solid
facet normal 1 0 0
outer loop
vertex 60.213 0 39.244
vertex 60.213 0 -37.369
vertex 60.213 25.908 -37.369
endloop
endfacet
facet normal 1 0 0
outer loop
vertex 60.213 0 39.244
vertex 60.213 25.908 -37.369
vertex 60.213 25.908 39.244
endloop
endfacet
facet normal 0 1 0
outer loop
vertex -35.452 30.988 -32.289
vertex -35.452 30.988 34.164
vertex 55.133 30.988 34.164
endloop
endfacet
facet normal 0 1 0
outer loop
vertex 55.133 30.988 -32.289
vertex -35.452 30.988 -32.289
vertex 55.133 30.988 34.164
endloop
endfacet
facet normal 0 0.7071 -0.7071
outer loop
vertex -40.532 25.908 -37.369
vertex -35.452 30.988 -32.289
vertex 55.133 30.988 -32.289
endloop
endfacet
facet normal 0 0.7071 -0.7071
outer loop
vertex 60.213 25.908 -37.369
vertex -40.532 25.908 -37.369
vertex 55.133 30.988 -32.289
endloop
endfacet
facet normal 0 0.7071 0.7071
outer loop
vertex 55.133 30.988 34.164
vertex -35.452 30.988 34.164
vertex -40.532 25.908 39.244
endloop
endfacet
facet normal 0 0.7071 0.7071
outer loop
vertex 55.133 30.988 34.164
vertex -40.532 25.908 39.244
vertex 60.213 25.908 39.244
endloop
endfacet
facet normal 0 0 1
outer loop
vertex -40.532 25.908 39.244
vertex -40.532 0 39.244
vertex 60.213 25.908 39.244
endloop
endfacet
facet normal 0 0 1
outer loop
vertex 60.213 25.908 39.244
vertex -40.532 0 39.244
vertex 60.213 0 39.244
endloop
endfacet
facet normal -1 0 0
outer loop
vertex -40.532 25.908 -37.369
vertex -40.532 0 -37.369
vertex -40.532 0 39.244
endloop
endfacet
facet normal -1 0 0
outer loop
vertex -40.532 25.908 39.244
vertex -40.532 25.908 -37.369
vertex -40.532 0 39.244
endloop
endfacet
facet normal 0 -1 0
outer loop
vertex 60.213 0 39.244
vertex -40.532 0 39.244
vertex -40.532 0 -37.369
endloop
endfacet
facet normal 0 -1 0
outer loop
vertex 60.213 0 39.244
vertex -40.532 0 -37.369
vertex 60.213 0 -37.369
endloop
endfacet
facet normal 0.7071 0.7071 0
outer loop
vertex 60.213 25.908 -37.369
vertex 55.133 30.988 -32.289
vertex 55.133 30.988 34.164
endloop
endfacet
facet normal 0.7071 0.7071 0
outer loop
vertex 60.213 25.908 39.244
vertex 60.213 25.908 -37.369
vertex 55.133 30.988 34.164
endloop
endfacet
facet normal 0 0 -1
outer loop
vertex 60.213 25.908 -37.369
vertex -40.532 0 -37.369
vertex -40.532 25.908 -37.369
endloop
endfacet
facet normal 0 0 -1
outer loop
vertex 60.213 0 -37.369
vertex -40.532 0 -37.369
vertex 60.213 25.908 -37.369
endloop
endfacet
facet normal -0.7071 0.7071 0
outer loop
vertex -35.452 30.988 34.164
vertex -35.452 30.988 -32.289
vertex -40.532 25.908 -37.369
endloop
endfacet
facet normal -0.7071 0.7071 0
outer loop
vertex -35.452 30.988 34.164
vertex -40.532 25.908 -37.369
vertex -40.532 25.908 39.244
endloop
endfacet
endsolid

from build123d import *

# Parameters (mm, degrees)
F0_W     = 100.744657
F0_H     = 76.6128
F1_DEPTH = 30.988
F2_SIZE  = 5.08


with BuildPart() as f1:
    # F0 (on Front) → F1 (new body)
    with BuildSketch(Plane.XZ):
        with Locations((9.840175, 0.93716)):
            Rectangle(F0_W, F0_H)
    extrude(amount=-F1_DEPTH)

    # F2
    f2_edges = [f1.edges().sort_by_distance(p)[0] for p in [
        (9.840176, 30.988, 39.24356),
        (-40.532153, 30.988, 0.93716),
        (9.840176, 30.988, -37.36924),
        (60.212504, 30.988, 0.93716),
    ]]
    chamfer(f2_edges, length=F2_SIZE)


solid = f1.part
